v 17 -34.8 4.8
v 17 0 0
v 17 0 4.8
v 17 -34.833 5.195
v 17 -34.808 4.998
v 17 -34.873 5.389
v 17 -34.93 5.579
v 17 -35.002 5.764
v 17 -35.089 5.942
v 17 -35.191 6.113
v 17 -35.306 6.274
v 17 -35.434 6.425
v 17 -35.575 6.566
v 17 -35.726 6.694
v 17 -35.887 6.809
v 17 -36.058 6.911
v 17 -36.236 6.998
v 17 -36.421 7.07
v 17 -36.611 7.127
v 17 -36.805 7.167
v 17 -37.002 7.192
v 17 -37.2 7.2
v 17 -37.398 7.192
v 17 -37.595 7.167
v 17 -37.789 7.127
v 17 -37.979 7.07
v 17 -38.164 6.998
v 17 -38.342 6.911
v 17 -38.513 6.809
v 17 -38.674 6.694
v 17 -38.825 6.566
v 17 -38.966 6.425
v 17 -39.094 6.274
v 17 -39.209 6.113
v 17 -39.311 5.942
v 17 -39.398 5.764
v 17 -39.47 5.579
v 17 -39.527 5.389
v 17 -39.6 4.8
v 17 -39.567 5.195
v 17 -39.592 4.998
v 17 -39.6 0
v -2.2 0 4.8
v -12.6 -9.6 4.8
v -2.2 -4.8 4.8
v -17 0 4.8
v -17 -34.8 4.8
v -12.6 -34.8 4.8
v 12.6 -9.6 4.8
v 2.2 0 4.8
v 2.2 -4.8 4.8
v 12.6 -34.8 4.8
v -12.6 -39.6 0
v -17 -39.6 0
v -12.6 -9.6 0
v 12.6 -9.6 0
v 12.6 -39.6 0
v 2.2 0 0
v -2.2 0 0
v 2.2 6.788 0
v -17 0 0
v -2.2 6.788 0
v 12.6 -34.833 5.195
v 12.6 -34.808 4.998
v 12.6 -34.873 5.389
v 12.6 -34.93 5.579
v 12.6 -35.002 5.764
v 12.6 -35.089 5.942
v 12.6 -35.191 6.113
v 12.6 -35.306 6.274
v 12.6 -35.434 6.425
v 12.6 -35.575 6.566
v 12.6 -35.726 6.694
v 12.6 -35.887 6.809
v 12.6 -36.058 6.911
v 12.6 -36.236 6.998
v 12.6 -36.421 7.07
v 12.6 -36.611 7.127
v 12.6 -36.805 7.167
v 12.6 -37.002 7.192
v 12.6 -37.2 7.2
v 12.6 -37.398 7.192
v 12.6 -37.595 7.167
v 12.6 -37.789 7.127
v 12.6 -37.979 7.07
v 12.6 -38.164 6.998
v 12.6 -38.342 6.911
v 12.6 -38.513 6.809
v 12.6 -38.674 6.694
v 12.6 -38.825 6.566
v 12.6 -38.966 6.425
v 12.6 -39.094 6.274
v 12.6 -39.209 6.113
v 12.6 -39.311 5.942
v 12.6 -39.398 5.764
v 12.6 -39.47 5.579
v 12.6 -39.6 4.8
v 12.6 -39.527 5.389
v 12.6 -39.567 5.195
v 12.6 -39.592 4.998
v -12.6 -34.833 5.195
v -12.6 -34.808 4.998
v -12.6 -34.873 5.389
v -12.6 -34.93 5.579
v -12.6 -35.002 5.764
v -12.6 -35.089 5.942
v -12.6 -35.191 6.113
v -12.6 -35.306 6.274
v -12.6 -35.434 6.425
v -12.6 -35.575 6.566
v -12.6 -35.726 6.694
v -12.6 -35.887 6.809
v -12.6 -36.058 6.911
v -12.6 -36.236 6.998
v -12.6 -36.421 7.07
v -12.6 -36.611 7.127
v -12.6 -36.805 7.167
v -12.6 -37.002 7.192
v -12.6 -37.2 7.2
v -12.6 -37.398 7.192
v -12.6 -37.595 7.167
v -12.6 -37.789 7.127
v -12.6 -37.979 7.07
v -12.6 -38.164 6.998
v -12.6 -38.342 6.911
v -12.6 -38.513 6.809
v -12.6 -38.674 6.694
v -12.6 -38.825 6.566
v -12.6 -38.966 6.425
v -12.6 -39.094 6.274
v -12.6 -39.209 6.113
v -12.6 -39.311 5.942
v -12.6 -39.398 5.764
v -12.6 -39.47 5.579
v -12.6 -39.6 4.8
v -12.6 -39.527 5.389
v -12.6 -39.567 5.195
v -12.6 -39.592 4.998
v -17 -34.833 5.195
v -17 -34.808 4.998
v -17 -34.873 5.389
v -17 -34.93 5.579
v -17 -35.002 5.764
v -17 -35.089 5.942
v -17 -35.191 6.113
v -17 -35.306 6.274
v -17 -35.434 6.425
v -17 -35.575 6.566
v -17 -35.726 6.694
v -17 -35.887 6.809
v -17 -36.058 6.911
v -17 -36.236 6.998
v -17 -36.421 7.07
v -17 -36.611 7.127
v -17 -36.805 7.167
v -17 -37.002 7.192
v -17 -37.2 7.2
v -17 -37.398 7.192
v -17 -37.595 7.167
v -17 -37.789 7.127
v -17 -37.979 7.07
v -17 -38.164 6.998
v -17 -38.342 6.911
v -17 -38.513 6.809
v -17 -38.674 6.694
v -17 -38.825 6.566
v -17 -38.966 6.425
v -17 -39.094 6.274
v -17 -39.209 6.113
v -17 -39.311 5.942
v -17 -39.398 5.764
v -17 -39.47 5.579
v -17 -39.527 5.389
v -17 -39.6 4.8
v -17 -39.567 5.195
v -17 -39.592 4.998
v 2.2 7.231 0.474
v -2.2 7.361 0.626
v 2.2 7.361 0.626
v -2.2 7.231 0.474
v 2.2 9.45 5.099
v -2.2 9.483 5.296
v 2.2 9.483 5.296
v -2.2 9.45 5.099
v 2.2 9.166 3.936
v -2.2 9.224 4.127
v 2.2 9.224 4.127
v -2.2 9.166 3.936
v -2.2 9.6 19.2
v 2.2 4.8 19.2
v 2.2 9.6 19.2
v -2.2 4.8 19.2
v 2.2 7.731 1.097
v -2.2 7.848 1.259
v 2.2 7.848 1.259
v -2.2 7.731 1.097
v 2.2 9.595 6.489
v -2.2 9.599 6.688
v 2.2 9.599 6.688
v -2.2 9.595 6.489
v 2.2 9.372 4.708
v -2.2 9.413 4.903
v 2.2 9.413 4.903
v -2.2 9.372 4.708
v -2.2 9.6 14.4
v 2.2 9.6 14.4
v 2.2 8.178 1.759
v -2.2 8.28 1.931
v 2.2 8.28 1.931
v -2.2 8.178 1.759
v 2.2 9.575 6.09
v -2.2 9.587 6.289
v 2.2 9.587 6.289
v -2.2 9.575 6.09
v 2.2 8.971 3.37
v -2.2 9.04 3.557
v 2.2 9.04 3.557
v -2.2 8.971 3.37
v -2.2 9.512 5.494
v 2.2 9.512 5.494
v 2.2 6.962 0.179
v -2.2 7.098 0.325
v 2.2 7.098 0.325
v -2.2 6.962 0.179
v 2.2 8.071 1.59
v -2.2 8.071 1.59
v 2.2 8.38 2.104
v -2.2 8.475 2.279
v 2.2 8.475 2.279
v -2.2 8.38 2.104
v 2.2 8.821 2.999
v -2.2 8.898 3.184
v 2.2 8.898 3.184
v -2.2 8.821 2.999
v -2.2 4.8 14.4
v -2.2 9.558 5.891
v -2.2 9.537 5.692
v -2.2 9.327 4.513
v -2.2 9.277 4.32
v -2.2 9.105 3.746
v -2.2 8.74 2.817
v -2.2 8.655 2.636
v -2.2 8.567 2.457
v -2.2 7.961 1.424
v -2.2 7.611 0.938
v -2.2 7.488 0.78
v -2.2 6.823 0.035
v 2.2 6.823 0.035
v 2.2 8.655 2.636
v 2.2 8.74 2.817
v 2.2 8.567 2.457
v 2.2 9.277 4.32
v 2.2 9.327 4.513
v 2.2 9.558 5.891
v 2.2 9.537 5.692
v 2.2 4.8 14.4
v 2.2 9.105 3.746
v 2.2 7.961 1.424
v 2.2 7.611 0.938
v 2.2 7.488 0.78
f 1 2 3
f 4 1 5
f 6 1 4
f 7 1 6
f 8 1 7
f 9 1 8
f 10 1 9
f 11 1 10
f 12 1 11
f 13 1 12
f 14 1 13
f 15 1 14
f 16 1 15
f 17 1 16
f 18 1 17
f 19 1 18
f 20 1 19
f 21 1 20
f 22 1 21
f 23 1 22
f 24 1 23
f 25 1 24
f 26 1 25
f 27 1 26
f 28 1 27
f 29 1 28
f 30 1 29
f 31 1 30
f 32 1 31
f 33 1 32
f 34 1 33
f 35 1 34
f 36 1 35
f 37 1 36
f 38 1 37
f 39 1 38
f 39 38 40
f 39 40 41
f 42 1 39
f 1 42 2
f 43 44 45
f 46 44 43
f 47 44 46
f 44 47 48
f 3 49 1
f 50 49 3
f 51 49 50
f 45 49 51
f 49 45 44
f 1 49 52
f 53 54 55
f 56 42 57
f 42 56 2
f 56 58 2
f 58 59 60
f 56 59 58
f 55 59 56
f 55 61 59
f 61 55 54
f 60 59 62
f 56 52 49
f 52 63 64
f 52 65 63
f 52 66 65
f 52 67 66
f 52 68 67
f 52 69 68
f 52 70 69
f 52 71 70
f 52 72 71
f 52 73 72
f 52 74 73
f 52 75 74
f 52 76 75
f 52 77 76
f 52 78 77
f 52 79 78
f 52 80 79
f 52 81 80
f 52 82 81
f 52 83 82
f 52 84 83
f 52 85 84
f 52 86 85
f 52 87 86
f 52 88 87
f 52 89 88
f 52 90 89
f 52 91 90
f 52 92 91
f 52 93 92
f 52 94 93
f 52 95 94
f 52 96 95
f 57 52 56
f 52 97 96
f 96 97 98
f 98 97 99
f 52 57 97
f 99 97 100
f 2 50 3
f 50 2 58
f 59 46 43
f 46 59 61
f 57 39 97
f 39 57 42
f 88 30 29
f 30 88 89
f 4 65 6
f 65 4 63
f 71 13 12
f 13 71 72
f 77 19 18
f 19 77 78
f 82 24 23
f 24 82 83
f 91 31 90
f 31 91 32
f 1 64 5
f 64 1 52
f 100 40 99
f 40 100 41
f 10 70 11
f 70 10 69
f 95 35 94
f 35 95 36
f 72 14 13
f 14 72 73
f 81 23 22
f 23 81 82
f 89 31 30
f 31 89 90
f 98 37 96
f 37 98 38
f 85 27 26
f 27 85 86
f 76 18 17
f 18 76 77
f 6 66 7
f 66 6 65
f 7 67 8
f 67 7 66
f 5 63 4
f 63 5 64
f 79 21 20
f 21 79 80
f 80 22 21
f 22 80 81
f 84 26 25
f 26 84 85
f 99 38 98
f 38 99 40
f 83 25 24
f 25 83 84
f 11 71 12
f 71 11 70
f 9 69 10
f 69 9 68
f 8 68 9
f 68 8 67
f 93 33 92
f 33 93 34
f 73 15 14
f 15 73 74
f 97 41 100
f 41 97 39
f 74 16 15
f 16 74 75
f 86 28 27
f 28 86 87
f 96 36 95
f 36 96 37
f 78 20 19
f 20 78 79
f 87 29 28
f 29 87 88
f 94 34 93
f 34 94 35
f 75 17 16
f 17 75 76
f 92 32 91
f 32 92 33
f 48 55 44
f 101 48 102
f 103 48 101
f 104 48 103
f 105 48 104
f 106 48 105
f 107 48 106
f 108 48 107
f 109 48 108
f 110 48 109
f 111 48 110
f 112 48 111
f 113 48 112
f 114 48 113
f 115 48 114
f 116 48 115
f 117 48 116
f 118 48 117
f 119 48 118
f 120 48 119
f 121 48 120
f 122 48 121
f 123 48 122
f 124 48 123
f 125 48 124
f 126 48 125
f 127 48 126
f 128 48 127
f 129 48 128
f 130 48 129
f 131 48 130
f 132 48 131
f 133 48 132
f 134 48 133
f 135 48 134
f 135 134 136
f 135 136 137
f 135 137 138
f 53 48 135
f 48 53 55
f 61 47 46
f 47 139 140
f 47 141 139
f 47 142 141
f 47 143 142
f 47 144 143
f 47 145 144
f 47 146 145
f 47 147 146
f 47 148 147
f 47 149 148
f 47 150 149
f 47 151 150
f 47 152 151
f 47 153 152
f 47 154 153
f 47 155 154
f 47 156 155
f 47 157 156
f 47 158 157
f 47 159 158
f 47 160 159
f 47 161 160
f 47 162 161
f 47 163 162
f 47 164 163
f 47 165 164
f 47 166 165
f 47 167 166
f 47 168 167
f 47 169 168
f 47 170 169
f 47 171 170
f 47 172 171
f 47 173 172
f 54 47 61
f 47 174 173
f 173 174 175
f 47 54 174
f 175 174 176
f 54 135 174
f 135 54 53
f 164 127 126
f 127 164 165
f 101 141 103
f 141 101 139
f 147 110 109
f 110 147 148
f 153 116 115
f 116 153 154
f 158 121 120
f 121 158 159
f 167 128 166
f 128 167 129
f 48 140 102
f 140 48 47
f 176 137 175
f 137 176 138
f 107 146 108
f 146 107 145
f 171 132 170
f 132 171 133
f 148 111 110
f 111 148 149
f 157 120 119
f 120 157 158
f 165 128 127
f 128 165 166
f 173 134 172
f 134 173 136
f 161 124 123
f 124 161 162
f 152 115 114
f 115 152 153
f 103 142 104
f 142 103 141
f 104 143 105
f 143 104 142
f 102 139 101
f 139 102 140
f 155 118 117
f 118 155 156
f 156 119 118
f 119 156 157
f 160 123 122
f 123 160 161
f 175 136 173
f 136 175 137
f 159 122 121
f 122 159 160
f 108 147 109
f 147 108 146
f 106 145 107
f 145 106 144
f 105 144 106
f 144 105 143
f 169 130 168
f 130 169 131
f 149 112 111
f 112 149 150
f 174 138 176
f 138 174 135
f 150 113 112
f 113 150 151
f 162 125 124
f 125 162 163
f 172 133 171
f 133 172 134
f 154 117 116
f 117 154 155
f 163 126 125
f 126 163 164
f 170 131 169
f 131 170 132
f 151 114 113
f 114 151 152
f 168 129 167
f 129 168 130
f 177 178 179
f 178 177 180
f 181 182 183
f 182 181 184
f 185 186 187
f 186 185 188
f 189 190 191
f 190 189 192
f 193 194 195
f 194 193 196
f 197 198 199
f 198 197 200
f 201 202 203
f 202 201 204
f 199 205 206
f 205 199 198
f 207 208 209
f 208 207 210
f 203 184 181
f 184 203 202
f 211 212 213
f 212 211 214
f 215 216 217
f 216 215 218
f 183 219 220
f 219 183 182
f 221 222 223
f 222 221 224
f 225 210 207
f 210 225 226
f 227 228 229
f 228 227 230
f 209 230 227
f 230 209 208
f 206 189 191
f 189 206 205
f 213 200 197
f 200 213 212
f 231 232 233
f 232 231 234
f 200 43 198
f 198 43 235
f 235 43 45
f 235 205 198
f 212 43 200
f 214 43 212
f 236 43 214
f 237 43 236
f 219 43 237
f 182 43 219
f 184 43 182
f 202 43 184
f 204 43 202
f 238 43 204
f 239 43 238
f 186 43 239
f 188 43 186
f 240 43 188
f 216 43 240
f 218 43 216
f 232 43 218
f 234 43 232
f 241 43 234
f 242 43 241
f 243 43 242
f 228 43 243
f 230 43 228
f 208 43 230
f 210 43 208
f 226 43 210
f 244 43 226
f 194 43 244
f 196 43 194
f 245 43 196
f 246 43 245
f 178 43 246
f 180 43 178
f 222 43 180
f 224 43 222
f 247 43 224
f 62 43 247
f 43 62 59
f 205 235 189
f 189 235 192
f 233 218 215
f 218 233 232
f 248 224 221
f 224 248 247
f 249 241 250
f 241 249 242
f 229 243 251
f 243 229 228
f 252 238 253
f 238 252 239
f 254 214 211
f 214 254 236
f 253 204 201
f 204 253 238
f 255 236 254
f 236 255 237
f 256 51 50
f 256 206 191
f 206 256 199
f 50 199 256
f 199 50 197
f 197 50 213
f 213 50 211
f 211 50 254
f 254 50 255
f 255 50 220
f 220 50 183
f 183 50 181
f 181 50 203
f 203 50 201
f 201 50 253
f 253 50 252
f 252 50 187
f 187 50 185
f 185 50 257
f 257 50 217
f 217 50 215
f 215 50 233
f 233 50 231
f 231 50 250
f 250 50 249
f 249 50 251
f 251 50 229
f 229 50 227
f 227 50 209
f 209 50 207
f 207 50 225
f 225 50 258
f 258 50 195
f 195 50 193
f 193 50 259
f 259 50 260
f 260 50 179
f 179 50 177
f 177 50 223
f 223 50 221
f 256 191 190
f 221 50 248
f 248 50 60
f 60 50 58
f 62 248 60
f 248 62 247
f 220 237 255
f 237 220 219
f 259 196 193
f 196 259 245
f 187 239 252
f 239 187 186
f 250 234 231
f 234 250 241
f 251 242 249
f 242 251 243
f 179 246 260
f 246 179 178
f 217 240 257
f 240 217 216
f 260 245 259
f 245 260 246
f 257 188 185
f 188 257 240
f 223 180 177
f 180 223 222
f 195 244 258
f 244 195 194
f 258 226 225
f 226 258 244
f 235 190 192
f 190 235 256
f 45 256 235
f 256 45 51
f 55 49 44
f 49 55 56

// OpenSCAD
include <ikea_skadis.scad>

skadis_squared_holder(l = 30, w = 20);
